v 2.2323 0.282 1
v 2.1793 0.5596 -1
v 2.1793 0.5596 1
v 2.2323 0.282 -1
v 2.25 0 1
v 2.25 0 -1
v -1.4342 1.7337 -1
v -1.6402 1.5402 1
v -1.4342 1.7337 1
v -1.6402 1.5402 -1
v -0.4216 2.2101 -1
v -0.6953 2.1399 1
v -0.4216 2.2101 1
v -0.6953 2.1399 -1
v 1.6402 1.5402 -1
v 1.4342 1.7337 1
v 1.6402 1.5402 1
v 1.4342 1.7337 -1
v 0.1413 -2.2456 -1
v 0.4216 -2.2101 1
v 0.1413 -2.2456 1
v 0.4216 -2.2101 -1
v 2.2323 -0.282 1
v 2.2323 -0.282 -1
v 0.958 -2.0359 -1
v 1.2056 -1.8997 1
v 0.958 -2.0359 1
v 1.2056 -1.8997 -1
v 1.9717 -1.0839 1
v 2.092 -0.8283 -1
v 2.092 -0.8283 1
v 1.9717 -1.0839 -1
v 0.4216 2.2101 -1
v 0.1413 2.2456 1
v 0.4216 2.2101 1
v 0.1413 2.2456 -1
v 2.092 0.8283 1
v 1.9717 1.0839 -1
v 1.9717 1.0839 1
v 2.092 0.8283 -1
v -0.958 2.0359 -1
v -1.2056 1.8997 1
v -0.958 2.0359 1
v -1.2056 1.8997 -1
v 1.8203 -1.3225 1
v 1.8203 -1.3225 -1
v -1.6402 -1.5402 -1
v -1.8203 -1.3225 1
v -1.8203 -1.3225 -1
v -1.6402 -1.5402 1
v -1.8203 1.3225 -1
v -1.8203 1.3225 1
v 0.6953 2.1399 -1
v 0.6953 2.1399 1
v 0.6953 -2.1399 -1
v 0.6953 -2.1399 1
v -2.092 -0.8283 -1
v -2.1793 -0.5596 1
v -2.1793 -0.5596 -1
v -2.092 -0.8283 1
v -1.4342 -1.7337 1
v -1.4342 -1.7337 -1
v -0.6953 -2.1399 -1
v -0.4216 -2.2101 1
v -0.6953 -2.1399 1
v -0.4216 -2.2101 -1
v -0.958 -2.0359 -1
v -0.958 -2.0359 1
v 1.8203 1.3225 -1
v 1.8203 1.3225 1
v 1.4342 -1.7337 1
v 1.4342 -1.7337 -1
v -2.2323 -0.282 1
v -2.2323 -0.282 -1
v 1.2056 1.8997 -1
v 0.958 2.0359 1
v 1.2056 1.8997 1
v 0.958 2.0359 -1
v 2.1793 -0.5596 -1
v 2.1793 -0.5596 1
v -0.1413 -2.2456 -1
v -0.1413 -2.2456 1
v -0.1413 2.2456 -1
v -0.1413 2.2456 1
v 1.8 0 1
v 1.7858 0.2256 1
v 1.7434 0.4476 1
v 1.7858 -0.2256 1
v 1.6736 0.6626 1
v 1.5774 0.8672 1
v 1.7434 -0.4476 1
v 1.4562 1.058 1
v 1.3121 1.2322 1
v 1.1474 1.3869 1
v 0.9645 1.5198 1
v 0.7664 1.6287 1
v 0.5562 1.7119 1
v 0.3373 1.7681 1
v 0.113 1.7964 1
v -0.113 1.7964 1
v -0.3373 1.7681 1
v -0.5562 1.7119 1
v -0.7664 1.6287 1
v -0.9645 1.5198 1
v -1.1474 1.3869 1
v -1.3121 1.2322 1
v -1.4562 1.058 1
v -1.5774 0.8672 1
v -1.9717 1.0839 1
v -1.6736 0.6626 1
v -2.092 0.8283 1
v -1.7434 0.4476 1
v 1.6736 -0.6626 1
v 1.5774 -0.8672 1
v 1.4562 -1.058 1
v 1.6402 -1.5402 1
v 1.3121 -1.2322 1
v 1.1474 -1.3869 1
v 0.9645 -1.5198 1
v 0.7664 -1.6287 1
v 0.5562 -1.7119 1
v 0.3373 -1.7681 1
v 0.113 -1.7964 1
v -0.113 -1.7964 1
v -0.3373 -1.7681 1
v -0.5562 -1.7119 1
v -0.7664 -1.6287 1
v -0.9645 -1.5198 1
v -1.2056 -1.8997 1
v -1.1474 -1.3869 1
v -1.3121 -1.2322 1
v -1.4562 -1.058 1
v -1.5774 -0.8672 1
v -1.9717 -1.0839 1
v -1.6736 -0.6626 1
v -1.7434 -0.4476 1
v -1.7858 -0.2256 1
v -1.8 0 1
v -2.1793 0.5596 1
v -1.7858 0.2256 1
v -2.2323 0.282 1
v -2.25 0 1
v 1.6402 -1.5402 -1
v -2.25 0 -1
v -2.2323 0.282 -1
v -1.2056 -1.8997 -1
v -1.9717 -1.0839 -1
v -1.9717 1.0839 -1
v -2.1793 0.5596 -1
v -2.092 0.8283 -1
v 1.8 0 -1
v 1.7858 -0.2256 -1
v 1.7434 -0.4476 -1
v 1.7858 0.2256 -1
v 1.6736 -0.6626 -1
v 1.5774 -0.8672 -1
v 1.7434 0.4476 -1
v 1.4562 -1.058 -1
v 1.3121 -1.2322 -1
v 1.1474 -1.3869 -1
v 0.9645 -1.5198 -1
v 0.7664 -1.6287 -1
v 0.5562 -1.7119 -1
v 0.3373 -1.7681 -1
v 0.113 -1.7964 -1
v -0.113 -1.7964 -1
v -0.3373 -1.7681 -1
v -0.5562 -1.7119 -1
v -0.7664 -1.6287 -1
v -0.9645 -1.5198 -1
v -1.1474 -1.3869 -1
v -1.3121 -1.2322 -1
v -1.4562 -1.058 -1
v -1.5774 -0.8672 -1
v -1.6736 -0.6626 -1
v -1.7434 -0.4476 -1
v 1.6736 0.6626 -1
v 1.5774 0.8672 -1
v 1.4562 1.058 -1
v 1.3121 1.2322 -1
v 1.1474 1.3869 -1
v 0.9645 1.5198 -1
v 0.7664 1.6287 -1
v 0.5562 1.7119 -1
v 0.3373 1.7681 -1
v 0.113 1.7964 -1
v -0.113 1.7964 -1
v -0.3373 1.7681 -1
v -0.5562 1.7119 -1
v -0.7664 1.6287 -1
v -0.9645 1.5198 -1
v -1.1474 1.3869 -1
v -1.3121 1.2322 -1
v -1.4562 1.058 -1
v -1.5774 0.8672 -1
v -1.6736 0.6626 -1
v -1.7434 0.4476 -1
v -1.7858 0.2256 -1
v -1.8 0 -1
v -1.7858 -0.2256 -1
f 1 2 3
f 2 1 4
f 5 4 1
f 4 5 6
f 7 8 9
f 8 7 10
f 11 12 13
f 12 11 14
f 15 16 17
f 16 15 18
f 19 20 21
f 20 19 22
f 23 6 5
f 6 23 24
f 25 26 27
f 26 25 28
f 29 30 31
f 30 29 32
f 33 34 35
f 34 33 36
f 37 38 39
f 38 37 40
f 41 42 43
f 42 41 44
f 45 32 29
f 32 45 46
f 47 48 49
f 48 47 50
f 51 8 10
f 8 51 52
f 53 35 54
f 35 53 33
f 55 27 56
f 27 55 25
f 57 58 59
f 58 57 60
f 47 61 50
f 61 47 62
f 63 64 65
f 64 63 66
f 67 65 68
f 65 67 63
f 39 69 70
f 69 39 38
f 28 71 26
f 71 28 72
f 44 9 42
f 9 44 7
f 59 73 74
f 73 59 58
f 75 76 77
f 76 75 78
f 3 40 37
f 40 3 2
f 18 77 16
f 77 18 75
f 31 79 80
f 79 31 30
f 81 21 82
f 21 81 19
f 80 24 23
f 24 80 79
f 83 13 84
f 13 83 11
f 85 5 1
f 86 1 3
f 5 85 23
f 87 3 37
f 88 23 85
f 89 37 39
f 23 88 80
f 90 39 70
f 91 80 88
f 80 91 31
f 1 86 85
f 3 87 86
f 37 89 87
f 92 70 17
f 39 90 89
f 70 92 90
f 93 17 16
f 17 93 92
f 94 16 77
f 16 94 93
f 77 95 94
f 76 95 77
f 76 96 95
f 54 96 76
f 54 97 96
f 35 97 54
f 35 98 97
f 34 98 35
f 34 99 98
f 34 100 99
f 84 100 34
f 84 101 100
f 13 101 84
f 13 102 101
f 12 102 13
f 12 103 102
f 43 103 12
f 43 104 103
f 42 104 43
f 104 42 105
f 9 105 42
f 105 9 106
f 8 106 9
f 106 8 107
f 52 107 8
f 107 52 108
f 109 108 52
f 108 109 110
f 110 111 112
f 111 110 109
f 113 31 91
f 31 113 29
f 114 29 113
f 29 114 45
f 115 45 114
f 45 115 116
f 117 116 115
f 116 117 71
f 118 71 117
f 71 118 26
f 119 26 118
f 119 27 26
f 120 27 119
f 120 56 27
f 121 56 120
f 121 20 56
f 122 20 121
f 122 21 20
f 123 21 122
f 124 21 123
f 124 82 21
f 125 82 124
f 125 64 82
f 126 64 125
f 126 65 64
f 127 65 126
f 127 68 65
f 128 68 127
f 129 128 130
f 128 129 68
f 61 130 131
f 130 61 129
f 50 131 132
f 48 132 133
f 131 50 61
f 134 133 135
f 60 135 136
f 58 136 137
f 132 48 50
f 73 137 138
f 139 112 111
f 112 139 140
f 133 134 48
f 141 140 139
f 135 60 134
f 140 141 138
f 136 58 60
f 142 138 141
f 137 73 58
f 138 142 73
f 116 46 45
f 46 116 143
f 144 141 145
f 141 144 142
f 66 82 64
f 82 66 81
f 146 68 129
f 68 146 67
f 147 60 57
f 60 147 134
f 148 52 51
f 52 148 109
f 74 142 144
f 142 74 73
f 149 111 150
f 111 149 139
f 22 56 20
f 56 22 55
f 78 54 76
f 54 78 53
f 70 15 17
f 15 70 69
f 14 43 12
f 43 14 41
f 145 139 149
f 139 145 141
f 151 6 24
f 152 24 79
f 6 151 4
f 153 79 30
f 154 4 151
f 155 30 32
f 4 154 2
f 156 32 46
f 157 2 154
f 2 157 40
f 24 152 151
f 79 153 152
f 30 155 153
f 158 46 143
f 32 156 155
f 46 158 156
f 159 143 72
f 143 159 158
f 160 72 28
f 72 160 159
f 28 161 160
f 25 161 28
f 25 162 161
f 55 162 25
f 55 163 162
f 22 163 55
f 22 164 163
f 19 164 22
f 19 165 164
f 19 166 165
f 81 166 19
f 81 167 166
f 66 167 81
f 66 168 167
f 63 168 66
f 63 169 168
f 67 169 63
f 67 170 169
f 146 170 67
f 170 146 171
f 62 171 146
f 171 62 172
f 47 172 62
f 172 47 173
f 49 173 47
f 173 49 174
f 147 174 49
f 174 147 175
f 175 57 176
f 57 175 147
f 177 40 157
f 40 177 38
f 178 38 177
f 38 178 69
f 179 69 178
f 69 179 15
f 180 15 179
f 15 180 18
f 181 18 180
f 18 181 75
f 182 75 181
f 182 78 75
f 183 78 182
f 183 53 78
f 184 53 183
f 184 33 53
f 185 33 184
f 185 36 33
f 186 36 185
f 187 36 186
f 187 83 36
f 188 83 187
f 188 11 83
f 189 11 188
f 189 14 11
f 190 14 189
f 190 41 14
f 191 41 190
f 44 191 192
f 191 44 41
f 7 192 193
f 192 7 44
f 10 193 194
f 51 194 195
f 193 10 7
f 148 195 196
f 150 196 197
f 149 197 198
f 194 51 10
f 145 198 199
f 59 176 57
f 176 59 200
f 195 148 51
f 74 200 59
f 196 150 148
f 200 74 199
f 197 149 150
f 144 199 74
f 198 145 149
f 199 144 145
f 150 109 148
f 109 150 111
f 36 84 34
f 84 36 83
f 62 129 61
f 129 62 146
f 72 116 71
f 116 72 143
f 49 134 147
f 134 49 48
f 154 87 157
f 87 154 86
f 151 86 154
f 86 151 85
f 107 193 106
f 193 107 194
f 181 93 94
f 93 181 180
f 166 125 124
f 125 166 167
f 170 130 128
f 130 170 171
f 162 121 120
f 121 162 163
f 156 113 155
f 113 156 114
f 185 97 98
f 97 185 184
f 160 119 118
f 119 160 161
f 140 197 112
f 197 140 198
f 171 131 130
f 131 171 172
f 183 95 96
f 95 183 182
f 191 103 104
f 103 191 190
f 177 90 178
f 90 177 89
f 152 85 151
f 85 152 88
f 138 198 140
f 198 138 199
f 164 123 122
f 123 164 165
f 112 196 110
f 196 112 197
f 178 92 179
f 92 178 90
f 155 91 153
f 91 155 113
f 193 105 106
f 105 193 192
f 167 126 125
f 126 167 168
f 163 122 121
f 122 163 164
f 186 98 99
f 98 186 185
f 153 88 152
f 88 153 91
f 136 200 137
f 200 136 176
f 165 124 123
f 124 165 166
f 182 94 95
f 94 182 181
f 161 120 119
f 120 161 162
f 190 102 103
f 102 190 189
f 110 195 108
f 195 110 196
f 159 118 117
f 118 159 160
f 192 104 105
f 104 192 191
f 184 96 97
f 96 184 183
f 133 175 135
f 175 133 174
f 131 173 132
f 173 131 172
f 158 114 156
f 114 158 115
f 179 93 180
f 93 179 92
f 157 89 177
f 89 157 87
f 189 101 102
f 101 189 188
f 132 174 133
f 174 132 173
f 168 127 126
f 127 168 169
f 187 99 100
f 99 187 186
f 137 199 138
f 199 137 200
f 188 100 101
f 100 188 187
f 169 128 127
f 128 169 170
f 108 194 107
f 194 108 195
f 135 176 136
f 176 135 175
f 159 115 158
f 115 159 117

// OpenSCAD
$fn = 50;


difference() {
	union() {
		translate(v = [0, 0, -1.0000000000]) {
			cylinder(h = 2, r = 2.2500000000);
		}
	}
	union() {
		#translate(v = [0, 0, -100.0000000000]) {
			cylinder(h = 200, r = 1.8000000000);
		}
	}
}
